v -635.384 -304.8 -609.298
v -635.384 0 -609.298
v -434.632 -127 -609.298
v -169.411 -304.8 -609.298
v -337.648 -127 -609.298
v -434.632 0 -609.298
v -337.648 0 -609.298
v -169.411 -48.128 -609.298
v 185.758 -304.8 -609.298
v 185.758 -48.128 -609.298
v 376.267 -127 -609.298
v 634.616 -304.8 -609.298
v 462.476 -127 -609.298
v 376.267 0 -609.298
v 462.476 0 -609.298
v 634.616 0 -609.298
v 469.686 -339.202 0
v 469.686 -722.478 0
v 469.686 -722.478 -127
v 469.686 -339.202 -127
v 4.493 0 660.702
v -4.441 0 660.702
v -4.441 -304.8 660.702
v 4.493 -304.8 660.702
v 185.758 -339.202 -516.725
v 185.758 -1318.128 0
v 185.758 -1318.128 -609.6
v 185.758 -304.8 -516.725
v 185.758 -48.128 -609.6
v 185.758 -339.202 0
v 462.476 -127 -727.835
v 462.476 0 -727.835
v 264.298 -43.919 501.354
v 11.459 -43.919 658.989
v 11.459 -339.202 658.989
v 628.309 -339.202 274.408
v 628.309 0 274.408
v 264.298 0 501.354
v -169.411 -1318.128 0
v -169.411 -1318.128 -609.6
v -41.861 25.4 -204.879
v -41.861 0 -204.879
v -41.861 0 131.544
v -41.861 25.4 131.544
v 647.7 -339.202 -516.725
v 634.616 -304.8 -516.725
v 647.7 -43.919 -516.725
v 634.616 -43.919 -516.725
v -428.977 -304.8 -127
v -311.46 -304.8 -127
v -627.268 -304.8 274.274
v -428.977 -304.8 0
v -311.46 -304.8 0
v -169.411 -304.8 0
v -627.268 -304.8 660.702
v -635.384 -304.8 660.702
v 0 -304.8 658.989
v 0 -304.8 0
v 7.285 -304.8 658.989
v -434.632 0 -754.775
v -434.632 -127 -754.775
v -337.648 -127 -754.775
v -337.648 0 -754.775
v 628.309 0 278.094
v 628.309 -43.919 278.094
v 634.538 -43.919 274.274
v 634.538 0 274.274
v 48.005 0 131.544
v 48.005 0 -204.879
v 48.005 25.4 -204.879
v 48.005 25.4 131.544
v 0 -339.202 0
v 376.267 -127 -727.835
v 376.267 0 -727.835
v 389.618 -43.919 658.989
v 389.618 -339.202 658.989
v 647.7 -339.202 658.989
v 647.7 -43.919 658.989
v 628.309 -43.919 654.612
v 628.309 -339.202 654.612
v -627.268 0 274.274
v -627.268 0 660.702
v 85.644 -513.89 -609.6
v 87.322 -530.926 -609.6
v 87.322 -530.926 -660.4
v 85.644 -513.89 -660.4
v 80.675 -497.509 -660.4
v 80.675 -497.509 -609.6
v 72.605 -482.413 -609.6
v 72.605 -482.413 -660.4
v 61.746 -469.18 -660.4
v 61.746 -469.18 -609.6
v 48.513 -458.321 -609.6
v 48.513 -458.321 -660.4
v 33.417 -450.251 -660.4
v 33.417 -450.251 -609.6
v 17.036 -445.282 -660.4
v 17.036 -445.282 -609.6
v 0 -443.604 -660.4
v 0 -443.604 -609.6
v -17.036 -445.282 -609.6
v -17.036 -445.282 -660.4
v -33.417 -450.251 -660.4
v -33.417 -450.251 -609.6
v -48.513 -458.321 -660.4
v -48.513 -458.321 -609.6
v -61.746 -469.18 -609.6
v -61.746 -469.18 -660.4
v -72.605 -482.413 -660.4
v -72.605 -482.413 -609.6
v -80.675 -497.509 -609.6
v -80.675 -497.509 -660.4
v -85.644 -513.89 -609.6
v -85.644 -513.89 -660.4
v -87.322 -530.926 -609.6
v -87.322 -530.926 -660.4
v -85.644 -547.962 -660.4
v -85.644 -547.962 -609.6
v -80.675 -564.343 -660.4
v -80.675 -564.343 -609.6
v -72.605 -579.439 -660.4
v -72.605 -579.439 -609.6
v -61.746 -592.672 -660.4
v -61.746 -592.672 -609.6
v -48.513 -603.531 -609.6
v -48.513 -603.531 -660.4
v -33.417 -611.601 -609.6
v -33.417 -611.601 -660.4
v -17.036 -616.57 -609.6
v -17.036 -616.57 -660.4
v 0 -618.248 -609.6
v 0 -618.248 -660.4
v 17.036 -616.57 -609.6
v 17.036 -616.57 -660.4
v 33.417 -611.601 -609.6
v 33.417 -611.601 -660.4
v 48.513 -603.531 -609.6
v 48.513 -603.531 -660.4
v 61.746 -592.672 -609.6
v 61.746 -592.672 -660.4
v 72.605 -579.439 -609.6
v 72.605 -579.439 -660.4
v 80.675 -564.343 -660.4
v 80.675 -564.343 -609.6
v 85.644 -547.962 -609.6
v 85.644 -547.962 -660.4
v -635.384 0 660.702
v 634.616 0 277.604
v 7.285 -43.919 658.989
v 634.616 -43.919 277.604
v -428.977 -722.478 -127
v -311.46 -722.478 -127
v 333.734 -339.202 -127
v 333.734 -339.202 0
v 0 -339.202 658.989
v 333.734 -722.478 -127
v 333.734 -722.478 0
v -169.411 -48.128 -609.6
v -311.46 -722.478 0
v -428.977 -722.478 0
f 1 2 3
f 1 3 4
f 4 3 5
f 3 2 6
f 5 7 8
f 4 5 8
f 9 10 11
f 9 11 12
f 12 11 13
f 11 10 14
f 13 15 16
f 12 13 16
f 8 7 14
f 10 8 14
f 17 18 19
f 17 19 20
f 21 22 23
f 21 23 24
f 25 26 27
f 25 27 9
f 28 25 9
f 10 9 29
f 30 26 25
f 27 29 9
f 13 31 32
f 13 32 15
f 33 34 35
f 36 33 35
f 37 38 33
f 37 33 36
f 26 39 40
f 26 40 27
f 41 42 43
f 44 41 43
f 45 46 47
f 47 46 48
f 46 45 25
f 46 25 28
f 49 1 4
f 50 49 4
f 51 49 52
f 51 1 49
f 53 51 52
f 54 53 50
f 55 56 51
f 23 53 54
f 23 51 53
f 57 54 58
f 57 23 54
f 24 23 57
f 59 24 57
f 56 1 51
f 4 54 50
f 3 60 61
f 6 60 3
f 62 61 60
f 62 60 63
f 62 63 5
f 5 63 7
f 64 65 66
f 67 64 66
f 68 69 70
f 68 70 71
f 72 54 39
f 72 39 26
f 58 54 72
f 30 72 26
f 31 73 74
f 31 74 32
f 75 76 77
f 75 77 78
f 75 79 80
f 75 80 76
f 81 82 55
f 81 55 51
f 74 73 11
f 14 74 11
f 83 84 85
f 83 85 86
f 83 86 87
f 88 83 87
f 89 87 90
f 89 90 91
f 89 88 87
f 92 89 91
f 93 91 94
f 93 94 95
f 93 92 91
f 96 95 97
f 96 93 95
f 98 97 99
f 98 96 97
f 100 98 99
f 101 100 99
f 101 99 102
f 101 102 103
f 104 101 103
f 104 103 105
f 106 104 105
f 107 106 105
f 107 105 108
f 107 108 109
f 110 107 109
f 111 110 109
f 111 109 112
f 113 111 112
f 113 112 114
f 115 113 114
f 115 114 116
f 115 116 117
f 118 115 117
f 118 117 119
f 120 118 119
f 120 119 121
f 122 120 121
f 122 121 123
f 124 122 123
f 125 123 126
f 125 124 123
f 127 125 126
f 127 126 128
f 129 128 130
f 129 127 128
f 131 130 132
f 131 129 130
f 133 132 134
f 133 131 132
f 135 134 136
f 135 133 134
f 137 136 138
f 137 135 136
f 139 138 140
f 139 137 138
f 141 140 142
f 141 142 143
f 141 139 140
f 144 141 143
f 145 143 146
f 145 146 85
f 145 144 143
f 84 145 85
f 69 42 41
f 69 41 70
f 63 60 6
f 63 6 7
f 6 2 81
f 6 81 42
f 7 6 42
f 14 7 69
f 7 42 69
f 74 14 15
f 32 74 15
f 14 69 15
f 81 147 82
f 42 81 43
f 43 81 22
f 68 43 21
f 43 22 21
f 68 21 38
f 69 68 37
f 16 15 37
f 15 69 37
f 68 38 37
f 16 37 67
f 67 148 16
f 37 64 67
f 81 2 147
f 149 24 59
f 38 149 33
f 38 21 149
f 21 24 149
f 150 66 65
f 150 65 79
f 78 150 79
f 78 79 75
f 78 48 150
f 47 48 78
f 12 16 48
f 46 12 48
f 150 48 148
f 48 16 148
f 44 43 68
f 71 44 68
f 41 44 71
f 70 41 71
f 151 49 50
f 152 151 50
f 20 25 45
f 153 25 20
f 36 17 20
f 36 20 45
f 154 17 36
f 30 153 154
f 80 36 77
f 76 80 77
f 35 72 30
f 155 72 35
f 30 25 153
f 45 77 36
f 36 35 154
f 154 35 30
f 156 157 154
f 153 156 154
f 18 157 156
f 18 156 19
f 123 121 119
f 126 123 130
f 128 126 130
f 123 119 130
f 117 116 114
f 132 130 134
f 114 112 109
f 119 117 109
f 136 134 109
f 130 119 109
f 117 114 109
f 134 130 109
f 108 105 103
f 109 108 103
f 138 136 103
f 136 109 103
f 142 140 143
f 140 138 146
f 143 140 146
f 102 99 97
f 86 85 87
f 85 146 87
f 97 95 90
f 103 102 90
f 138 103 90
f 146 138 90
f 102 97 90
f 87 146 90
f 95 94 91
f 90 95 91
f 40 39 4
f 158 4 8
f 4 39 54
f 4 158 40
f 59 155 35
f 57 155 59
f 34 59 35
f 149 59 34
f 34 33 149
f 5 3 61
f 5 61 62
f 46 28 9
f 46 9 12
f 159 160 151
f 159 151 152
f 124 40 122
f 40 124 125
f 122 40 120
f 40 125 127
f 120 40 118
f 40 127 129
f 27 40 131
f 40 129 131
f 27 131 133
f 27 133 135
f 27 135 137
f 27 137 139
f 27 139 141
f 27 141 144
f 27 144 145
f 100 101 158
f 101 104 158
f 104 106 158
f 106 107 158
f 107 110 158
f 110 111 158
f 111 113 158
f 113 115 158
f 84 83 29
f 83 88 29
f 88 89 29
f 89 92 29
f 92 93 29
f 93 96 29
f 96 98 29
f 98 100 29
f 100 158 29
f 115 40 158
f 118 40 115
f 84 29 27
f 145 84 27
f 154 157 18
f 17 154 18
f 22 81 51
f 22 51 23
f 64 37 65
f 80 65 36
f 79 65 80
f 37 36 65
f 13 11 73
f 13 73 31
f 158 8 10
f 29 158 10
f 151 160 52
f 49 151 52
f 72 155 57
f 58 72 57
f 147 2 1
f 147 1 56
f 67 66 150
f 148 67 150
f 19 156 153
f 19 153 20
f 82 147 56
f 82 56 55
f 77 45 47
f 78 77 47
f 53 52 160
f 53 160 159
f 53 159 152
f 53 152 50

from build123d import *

# Parameters (mm, degrees)
F0_W      = 1270
F0_H      = 1270
F1_DEPTH  = 304.8
F2_W      = 355.16951
F2_H      = 1270
F3_DEPTH  = 609.6
F4_R      = 87.321685
F5_DEPTH  = 660.4
F6_W      = 86.208582
F6_H      = 414.878845
F6_W_2    = 96.984655
F6_H_2    = 441.819012
F7_DEPTH  = 127
F8_W      = 135.951609
F8_H      = 651.744328
F8_W_2    = 117.517472
F8_H_2    = 622.415811
F9_DEPTH  = 127
F11_DEPTH = 381
F12_W     = 89.866299
F12_H     = 336.422592
F13_DEPTH = 25.4
F14_W     = 295.283154
F14_H     = 1175.713479
F15_DEPTH = 647.7
F17_DEPTH = 508


with BuildPart() as f1:
    # F0 (on Front) → F1 (new body)
    with BuildSketch(Plane.XZ):
        with Locations((-0.384308, 25.70168)):
            Rectangle(F0_W, F0_H)
    extrude(amount=F1_DEPTH)

    # F2 (on Top) → F3 (join)
    with BuildSketch(Plane.XY):
        with Locations((8.173354, -683.127984)):
            Rectangle(F2_W, F2_H)
    extrude(amount=-F3_DEPTH)

    # F4 (on Top) → F5 (join)
    with BuildSketch(Plane.XY):
        with Locations((0, -530.925989)):
            Circle(F4_R)
    extrude(amount=-F5_DEPTH)

    # F6 (on Front) → F7 (join)
    with BuildSketch(Plane.XZ):
        with Locations((419.371635, -520.395398)):
            Rectangle(F6_W, F6_H)
        with Locations((-386.139914, -533.865482)):
            Rectangle(F6_W_2, F6_H_2)
    extrude(amount=F7_DEPTH)

    # F8 (on Top) → F9 (join)
    with BuildSketch(Plane.XY):
        with Locations((401.709839, -396.605987)):
            Rectangle(F8_W, F8_H)
        with Locations((-370.218724, -411.270245)):
            Rectangle(F8_W_2, F8_H_2)
    extrude(amount=-F9_DEPTH)

    # F10 (on Front) → F11 (cut)
    with BuildSketch(Plane.XZ):
        Polygon((-627.267778, 274.273783), (0, 663.457155), (-627.267778, 663.457155), align=None)
        Polygon((0, 663.457155), (634.537637, 274.273783), (643.659174, 663.457155), align=None)
    extrude(amount=F11_DEPTH, mode=Mode.SUBTRACT)

    # F12 (on Front) → F13 (join)
    with BuildSketch(Plane.XZ):
        with Locations((3.072093, -36.667466)):
            Rectangle(F12_W, F12_H)
    extrude(amount=-F13_DEPTH)

    # F14 (on Right) → F15 (join)
    with BuildSketch(Plane.YZ):
        with Locations((-191.560142, 71.131975)):
            Rectangle(F14_W, F14_H)
    extrude(amount=F15_DEPTH)

    # F16 (on Front) → F17 (cut)
    with BuildSketch(Plane.XZ):
        Polygon((628.30925, 654.611826), (0, 666.133165), (628.30925, 274.408251), align=None)
    extrude(amount=F17_DEPTH, mode=Mode.SUBTRACT)


solid = f1.part
